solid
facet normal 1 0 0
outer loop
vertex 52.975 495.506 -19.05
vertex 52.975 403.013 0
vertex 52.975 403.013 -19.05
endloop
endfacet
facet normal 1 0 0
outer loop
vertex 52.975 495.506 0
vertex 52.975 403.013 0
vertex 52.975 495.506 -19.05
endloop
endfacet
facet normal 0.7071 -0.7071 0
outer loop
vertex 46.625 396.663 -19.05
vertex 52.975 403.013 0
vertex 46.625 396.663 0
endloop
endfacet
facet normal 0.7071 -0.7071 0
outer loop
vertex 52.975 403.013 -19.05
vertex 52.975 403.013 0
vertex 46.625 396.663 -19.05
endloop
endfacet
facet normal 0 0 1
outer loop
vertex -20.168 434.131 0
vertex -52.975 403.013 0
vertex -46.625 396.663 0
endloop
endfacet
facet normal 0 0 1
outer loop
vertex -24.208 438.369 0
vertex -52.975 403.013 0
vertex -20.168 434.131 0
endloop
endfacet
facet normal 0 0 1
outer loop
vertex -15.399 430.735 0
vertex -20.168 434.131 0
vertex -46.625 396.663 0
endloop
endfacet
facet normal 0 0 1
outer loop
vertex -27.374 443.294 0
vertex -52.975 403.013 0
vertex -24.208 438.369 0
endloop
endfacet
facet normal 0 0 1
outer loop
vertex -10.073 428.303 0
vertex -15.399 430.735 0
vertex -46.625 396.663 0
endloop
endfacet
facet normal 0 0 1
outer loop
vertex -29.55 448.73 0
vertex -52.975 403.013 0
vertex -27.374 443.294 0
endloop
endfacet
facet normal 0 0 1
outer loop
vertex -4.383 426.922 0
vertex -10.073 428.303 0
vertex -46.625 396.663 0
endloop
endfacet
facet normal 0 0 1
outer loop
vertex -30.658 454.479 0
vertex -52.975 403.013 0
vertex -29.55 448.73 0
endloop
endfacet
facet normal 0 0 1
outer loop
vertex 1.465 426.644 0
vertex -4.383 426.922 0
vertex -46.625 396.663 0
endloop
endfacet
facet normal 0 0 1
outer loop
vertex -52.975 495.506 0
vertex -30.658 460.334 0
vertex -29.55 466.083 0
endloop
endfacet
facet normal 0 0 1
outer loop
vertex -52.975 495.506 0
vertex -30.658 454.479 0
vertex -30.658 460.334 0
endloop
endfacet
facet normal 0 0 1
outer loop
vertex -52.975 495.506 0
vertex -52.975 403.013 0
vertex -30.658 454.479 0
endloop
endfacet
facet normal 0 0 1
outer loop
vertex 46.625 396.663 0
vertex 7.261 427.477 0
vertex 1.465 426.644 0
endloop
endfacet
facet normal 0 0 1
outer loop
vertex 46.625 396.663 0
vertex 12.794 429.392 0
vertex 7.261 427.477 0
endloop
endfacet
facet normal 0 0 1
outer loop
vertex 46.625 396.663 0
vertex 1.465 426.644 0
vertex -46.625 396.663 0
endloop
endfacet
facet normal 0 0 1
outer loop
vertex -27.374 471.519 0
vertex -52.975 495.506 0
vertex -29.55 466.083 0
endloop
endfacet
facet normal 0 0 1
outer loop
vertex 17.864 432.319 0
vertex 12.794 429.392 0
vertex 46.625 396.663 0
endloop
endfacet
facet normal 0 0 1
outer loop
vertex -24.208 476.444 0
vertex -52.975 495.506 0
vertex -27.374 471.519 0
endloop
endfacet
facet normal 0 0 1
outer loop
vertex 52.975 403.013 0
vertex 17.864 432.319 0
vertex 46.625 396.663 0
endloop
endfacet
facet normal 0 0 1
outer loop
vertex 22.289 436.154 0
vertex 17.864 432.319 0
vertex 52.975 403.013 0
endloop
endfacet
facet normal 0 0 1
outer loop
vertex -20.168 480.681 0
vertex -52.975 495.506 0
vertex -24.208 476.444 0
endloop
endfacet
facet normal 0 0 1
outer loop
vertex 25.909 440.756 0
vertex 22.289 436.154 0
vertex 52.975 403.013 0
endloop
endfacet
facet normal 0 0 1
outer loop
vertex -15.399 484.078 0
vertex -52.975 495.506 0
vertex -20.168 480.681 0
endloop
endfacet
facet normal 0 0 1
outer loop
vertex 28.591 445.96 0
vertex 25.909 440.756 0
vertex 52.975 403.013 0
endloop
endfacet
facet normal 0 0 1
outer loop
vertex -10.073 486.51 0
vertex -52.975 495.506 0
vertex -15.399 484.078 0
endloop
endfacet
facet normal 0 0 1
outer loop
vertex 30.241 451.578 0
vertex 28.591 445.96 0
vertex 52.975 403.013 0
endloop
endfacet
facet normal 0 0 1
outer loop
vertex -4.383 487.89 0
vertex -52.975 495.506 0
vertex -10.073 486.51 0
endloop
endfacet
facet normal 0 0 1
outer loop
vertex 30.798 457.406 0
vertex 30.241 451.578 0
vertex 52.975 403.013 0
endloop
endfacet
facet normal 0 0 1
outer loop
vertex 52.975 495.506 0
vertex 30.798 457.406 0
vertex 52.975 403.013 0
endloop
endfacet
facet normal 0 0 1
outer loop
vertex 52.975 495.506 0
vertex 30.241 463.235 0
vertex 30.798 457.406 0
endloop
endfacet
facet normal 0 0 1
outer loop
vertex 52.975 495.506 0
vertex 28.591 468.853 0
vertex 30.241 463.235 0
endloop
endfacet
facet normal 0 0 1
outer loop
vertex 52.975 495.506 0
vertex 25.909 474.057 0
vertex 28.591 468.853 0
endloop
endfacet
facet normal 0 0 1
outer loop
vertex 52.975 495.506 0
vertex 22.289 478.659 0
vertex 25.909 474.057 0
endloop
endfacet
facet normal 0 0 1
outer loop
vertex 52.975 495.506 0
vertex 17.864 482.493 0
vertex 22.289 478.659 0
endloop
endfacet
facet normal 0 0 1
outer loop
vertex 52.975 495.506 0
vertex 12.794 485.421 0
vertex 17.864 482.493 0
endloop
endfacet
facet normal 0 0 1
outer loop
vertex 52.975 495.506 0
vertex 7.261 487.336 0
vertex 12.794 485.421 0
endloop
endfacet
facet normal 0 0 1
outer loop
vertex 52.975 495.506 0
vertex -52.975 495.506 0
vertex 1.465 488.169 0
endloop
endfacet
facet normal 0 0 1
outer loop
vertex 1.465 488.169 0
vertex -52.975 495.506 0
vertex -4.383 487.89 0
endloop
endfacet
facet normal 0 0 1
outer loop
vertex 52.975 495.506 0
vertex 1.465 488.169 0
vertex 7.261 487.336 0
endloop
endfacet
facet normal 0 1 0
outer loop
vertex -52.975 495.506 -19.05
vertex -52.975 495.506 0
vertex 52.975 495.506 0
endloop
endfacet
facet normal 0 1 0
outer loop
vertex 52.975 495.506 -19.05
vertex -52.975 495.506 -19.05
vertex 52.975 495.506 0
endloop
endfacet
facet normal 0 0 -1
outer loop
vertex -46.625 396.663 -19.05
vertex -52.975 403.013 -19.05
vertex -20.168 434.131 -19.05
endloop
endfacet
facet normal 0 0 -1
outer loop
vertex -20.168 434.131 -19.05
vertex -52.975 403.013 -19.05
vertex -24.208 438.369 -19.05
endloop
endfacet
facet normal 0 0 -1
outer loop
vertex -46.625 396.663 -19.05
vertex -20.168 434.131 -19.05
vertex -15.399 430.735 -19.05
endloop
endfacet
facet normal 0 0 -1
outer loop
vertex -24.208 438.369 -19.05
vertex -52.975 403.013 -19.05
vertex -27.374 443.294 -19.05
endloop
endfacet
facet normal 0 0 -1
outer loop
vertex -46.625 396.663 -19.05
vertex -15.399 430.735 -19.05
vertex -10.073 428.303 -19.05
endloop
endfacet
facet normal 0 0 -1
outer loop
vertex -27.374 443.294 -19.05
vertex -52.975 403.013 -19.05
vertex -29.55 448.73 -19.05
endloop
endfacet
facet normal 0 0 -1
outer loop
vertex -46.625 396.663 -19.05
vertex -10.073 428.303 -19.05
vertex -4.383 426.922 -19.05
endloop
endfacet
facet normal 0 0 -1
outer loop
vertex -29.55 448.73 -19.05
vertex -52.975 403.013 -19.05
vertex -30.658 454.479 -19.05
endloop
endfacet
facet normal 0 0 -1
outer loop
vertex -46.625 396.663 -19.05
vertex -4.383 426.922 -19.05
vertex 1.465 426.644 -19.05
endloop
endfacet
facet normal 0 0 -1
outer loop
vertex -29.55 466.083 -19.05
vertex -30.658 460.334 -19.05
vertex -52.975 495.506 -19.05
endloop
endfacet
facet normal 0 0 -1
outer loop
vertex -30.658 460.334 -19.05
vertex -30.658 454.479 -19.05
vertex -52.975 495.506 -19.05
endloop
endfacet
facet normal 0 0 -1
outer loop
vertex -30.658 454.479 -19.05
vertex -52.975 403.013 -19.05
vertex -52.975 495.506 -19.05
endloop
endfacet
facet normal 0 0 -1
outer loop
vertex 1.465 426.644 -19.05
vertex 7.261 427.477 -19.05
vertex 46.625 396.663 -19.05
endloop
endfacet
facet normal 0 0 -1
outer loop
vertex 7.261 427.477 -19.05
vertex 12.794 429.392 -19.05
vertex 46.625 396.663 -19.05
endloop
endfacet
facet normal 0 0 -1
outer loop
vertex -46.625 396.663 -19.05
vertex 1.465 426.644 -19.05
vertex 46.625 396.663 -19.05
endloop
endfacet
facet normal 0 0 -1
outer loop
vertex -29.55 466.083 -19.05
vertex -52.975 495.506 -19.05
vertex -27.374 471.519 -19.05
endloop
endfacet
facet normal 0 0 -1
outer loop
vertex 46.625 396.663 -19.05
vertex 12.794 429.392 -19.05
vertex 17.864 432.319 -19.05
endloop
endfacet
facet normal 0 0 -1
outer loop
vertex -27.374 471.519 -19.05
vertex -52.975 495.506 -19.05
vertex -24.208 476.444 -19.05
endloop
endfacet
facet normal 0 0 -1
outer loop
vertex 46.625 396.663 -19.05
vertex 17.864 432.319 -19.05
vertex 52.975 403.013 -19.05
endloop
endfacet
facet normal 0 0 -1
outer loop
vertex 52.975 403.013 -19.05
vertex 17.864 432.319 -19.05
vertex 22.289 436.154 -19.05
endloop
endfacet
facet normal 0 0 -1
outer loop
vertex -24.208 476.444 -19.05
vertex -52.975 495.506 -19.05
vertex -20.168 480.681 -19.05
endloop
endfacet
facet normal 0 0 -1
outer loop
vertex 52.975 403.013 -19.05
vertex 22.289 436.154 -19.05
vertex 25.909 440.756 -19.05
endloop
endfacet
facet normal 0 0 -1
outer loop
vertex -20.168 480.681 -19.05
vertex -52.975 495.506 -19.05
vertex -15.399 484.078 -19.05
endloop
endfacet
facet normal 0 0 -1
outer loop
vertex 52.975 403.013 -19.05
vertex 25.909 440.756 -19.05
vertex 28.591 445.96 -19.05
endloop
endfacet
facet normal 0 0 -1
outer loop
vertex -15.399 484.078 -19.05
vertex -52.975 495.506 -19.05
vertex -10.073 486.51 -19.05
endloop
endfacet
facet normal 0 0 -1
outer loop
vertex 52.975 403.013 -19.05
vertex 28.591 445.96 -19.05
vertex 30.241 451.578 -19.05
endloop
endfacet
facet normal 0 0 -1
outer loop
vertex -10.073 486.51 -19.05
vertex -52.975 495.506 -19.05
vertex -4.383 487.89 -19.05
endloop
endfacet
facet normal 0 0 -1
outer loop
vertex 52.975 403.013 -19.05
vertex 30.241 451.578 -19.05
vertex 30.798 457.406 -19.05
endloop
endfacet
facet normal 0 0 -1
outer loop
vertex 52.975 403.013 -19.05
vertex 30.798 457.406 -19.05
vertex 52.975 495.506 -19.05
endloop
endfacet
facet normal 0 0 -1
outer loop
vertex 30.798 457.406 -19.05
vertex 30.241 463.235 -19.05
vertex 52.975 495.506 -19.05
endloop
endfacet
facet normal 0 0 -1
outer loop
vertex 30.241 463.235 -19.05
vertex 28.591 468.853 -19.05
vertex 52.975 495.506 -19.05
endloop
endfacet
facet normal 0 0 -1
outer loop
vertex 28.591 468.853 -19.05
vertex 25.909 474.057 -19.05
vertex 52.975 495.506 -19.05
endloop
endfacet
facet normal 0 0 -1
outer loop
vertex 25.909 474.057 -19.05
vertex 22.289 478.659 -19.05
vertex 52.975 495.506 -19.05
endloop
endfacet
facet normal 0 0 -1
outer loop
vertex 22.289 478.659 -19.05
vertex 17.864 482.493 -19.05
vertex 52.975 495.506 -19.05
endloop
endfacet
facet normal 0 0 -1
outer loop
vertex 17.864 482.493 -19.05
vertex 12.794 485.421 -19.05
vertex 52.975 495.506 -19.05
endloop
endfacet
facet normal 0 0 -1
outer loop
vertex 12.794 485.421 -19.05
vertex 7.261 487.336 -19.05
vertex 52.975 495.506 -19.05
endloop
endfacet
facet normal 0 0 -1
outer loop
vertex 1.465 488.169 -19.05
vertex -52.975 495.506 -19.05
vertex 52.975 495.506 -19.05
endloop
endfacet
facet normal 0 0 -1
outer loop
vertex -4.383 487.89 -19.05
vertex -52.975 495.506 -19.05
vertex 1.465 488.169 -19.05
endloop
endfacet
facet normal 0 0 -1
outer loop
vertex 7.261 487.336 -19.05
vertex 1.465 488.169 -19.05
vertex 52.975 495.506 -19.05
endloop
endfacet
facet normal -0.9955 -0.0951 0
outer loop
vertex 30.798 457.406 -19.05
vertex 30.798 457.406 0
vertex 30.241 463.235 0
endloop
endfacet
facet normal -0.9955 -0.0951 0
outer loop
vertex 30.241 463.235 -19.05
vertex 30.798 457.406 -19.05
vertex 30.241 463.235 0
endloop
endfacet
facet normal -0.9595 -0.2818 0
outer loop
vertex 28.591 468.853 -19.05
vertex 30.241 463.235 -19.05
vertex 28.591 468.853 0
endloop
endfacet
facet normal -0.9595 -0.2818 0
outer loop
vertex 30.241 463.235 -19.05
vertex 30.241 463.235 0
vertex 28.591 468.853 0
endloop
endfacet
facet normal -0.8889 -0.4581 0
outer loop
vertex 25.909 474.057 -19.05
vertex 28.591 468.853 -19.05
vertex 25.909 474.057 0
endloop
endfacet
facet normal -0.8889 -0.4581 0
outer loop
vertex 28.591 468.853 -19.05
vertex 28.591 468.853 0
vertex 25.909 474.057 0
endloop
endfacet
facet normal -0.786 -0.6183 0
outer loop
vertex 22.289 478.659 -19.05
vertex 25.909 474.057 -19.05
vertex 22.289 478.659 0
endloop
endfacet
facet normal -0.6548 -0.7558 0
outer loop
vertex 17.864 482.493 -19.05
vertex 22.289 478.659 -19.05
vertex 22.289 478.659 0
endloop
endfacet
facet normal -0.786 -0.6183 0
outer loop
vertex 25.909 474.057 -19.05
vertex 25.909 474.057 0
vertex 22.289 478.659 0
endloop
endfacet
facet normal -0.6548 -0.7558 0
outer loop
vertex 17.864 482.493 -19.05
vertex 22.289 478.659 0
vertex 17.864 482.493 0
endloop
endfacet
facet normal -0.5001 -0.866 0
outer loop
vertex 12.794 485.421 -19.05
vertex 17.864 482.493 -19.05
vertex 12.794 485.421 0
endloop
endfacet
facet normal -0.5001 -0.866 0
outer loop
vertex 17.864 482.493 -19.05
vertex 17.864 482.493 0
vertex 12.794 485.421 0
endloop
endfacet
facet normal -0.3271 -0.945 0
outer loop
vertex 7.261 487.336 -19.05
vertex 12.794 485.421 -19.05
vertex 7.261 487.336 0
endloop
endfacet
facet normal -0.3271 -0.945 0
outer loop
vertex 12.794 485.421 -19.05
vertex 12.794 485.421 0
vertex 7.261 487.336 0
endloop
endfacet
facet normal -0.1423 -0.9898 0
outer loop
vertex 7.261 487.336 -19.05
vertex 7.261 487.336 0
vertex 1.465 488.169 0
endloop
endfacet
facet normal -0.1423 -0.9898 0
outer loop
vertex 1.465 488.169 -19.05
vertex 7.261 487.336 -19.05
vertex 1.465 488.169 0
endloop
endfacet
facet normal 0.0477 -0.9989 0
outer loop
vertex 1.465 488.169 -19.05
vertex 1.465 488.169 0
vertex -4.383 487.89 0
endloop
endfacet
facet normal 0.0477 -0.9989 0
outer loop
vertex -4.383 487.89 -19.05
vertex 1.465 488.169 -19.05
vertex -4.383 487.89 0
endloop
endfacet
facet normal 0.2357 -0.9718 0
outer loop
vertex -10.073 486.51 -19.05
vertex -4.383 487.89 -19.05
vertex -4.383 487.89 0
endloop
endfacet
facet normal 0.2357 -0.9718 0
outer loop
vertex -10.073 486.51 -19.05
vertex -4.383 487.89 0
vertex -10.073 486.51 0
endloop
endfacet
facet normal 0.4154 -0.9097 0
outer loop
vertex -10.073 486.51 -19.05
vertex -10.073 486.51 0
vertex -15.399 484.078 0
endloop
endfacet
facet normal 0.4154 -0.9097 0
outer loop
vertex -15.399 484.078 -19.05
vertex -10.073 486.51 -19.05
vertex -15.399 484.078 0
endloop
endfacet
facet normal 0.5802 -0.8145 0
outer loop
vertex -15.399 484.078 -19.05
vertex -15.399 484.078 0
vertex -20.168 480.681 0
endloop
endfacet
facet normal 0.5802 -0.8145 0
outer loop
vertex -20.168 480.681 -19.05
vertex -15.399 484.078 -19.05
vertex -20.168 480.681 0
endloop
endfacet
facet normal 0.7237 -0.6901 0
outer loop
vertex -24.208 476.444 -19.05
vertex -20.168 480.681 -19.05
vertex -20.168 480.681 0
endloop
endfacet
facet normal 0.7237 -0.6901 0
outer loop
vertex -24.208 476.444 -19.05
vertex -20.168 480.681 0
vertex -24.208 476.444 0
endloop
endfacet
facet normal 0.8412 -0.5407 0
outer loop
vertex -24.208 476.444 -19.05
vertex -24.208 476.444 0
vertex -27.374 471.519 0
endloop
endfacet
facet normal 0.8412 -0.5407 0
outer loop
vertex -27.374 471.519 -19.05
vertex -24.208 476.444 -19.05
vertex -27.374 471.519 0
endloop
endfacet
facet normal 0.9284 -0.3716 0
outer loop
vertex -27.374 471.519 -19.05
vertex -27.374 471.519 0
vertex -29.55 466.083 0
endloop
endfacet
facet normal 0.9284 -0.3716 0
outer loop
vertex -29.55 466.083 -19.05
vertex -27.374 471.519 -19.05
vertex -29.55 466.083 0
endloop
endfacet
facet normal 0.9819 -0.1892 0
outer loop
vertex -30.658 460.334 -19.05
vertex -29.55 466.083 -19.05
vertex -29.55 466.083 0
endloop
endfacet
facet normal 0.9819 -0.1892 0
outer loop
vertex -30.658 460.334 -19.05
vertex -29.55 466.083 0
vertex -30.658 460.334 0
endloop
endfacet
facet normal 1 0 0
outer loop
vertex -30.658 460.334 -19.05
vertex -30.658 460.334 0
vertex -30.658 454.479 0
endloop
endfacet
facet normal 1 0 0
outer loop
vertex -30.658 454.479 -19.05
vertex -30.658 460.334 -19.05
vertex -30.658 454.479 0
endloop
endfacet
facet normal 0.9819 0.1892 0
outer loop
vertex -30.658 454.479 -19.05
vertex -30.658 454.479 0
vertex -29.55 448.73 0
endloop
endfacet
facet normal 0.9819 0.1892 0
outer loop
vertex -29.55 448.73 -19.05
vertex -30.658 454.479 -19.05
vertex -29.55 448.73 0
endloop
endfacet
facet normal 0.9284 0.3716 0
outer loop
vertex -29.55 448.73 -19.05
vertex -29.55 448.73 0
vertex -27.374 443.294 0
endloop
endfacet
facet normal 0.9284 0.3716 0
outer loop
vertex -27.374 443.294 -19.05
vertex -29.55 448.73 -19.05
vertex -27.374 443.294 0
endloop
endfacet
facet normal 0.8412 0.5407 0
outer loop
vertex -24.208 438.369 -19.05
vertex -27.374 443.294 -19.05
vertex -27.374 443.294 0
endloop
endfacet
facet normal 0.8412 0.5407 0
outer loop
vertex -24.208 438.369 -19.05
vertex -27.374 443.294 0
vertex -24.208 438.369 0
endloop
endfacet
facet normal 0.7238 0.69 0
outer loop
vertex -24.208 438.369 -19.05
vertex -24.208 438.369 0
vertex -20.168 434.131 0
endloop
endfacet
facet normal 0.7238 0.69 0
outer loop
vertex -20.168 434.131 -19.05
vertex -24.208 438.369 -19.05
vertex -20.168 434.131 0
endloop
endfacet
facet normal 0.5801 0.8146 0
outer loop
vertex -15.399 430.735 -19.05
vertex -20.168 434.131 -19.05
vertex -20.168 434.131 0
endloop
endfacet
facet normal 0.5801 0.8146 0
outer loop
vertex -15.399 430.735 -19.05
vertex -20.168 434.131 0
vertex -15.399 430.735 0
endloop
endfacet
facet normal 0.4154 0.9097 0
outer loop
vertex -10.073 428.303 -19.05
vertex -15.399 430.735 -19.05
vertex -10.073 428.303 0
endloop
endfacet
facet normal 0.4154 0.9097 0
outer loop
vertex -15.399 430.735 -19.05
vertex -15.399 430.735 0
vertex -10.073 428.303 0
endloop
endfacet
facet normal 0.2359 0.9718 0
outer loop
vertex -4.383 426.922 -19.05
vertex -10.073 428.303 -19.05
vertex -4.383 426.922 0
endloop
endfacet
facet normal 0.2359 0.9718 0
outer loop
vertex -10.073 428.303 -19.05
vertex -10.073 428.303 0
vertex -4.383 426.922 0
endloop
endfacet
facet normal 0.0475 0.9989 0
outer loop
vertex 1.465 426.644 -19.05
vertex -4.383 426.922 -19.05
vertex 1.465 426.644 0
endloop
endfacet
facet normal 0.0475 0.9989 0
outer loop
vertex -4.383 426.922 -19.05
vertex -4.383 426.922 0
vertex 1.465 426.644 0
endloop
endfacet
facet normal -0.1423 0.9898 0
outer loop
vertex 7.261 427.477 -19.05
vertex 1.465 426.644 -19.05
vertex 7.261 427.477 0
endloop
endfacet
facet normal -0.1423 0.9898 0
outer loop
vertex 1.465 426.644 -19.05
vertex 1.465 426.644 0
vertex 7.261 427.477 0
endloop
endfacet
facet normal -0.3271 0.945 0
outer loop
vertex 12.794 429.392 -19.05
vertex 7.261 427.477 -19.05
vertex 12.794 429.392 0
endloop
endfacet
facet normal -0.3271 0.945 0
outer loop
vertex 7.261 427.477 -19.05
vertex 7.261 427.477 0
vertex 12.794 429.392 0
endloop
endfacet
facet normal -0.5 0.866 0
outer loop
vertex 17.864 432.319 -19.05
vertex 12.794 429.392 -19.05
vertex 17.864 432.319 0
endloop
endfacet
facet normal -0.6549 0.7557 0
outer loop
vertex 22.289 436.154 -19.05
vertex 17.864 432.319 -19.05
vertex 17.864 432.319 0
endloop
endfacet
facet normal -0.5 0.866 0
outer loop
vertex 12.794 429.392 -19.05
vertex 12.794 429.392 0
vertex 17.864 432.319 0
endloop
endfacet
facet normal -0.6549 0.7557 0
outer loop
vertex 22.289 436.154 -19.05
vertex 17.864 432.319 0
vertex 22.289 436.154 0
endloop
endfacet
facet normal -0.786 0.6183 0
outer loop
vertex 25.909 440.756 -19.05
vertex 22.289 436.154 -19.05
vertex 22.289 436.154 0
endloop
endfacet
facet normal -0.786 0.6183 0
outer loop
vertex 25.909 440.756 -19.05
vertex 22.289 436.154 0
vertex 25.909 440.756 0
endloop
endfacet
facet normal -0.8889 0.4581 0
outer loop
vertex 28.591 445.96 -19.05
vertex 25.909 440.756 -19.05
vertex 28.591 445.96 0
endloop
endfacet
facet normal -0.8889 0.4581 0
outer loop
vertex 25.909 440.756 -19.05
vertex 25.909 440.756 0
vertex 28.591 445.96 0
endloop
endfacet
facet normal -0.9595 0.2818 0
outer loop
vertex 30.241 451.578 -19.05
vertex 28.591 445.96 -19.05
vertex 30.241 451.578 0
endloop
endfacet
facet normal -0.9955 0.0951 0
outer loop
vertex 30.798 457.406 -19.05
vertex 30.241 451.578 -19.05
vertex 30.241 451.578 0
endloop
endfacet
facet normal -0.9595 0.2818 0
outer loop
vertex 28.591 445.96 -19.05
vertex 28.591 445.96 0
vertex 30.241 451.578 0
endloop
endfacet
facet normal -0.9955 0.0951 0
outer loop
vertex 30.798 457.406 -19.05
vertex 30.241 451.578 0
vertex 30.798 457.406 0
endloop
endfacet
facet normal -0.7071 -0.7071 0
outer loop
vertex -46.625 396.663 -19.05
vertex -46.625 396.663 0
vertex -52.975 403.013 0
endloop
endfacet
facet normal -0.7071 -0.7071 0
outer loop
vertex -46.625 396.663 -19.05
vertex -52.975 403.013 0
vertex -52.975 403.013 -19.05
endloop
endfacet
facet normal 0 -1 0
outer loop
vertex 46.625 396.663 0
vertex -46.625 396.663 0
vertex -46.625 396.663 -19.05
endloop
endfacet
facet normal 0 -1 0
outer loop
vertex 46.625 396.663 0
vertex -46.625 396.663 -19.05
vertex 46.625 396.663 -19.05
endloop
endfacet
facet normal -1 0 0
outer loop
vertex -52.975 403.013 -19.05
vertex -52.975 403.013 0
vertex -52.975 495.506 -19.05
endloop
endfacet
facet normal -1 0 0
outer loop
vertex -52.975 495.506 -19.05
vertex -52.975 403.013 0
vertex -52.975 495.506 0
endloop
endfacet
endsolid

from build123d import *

# Parameters (mm, degrees)
SKETCH1_W           = 105.949999994
SKETCH1_H           = 98.843650928
BOSS_EXTRUDE1_DEPTH = 19.05
SKETCH2_R           = 30.7975
CUT_EXTRUDE1_DEPTH  = 499.69403033
CHAMFER1_SIZE       = 6.35


with BuildPart() as part:
    # Sketch1 → Boss-Extrude1 (new body)
    with BuildSketch(Plane.XY):
        with Locations((0, 446.084463863)):
            Rectangle(SKETCH1_W, SKETCH1_H)
    extrude(amount=-BOSS_EXTRUDE1_DEPTH)

    # Sketch2 → Cut-Extrude1 (cut, through all)
    with BuildSketch(Plane.XY):
        with Locations((0, 457.406289235)):
            Circle(SKETCH2_R)
    extrude(amount=-CUT_EXTRUDE1_DEPTH, mode=Mode.SUBTRACT)

    # Chamfer1
    chamfer1_edges = [part.edges().sort_by_distance(p)[0] for p in [
        (52.974999997, 396.662638399, -9.525),
        (-52.974999997, 396.662638399, -9.525),
    ]]
    chamfer(chamfer1_edges, length=CHAMFER1_SIZE)


solid = part.part
